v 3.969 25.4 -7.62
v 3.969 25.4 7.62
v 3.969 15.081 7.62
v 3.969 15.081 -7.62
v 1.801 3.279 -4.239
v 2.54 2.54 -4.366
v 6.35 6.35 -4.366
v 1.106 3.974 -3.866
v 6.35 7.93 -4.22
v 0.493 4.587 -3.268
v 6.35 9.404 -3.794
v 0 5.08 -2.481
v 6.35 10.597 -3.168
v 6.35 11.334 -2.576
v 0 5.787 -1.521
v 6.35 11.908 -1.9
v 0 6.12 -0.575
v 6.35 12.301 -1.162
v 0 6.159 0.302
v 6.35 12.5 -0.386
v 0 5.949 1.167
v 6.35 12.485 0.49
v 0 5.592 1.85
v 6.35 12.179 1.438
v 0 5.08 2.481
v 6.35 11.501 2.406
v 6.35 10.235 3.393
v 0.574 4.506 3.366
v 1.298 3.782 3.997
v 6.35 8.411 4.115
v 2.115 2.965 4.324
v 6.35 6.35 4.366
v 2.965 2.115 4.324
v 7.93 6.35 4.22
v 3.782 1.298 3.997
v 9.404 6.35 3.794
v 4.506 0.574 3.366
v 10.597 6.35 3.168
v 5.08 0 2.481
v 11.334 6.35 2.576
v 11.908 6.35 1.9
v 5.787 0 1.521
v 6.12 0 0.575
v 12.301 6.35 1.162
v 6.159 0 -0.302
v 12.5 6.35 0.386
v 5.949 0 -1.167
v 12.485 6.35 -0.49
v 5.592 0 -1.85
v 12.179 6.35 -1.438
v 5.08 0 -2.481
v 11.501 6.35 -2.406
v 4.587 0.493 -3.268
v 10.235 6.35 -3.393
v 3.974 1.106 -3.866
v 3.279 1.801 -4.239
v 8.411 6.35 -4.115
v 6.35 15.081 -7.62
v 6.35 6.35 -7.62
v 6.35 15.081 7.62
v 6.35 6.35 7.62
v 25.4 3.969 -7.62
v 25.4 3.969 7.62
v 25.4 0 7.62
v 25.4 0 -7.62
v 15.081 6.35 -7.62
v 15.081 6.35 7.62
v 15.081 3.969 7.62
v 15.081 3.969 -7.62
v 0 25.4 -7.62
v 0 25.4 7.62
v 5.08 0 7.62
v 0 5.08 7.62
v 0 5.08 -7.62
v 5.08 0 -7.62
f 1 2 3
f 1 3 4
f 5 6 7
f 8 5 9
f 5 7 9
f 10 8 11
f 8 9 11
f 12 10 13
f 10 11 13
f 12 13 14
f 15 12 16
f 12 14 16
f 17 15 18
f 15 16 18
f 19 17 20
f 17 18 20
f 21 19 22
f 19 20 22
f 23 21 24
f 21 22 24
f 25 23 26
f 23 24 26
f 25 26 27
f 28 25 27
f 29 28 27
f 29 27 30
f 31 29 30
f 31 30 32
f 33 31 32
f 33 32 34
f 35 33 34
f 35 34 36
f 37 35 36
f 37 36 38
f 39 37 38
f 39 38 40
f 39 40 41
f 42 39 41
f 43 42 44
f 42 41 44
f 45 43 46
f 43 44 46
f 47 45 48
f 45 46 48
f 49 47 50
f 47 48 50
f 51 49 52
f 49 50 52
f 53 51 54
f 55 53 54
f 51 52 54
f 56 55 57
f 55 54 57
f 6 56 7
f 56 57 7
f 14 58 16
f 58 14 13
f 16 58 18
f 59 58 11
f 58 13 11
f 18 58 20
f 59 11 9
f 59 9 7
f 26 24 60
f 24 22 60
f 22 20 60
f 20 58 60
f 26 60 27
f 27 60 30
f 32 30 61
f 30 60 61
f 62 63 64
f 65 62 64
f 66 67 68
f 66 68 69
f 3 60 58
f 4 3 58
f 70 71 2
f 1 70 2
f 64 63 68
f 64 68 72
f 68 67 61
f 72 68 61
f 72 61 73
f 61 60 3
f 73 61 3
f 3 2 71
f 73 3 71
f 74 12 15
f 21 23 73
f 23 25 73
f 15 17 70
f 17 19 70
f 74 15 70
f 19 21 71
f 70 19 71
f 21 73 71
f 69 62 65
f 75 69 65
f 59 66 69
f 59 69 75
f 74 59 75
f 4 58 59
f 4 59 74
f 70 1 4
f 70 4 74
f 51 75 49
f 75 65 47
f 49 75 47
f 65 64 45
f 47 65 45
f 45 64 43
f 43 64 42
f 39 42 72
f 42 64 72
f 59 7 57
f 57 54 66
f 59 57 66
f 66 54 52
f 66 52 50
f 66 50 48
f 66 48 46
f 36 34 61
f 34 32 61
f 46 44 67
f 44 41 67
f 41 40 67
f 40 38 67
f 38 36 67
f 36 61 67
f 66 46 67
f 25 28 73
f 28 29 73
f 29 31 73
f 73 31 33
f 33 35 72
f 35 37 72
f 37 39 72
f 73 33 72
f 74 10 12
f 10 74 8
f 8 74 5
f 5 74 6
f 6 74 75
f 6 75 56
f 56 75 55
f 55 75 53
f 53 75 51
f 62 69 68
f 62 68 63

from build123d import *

# Parameters (mm, degrees)
BOSS_EXTRUDE1_DEPTH              = 7.62
SKETCH2_W                        = 15.24
SKETCH2_H                        = 10.31875
CUT_EXTRUDE1_DEPTH               = 2.38125
SKETCH4_W                        = 10.31875
SKETCH4_H                        = 15.24
CUT_EXTRUDE2_DEPTH               = 2.38125
CHAMFER1_SIZE                    = 5.08
F_11_32_0_34375_DIAMETER_HOLE1_D = 8.73125


with BuildPart() as part:
    # Sketch1 → Boss-Extrude1 (new body, symmetric)
    with BuildSketch(Plane.XY):
        Polygon((0, 0), (0, 25.4), (6.35, 25.4), (6.35, 6.35), (25.4, 6.35), (25.4, 0), align=None)
    extrude(amount=BOSS_EXTRUDE1_DEPTH, both=True)

    # Sketch2 → Cut-Extrude1 (cut)
    with BuildSketch(Plane(origin=(6.35, 0, 0), x_dir=(0, 0, -1), z_dir=(1, 0, 0))):
        with Locations((0, 20.240625)):
            Rectangle(SKETCH2_W, SKETCH2_H)
    extrude(amount=-CUT_EXTRUDE1_DEPTH, mode=Mode.SUBTRACT)

    # Sketch4 → Cut-Extrude2 (cut)
    with BuildSketch(Plane(origin=(0, 6.35, 0), x_dir=(1, 0, 0), z_dir=(0, 1, 0))):
        with Locations((20.240625, 0)):
            Rectangle(SKETCH4_W, SKETCH4_H)
    extrude(amount=-CUT_EXTRUDE2_DEPTH, mode=Mode.SUBTRACT)

    # Chamfer1
    chamfer1_edges = [part.edges().sort_by_distance(p)[0] for p in [
        (0, 0, 0),
    ]]
    chamfer(chamfer1_edges, length=CHAMFER1_SIZE)

    # 11/32 (0.34375) Diameter Hole1 (through all)
    with Locations(Plane(origin=(2.54, 2.54, 0), x_dir=(0, 0, 1), z_dir=(-0.707106781, -0.707106781, 0))):
        with Locations((0, 0)):
            Hole(F_11_32_0_34375_DIAMETER_HOLE1_D / 2)


solid = part.part
